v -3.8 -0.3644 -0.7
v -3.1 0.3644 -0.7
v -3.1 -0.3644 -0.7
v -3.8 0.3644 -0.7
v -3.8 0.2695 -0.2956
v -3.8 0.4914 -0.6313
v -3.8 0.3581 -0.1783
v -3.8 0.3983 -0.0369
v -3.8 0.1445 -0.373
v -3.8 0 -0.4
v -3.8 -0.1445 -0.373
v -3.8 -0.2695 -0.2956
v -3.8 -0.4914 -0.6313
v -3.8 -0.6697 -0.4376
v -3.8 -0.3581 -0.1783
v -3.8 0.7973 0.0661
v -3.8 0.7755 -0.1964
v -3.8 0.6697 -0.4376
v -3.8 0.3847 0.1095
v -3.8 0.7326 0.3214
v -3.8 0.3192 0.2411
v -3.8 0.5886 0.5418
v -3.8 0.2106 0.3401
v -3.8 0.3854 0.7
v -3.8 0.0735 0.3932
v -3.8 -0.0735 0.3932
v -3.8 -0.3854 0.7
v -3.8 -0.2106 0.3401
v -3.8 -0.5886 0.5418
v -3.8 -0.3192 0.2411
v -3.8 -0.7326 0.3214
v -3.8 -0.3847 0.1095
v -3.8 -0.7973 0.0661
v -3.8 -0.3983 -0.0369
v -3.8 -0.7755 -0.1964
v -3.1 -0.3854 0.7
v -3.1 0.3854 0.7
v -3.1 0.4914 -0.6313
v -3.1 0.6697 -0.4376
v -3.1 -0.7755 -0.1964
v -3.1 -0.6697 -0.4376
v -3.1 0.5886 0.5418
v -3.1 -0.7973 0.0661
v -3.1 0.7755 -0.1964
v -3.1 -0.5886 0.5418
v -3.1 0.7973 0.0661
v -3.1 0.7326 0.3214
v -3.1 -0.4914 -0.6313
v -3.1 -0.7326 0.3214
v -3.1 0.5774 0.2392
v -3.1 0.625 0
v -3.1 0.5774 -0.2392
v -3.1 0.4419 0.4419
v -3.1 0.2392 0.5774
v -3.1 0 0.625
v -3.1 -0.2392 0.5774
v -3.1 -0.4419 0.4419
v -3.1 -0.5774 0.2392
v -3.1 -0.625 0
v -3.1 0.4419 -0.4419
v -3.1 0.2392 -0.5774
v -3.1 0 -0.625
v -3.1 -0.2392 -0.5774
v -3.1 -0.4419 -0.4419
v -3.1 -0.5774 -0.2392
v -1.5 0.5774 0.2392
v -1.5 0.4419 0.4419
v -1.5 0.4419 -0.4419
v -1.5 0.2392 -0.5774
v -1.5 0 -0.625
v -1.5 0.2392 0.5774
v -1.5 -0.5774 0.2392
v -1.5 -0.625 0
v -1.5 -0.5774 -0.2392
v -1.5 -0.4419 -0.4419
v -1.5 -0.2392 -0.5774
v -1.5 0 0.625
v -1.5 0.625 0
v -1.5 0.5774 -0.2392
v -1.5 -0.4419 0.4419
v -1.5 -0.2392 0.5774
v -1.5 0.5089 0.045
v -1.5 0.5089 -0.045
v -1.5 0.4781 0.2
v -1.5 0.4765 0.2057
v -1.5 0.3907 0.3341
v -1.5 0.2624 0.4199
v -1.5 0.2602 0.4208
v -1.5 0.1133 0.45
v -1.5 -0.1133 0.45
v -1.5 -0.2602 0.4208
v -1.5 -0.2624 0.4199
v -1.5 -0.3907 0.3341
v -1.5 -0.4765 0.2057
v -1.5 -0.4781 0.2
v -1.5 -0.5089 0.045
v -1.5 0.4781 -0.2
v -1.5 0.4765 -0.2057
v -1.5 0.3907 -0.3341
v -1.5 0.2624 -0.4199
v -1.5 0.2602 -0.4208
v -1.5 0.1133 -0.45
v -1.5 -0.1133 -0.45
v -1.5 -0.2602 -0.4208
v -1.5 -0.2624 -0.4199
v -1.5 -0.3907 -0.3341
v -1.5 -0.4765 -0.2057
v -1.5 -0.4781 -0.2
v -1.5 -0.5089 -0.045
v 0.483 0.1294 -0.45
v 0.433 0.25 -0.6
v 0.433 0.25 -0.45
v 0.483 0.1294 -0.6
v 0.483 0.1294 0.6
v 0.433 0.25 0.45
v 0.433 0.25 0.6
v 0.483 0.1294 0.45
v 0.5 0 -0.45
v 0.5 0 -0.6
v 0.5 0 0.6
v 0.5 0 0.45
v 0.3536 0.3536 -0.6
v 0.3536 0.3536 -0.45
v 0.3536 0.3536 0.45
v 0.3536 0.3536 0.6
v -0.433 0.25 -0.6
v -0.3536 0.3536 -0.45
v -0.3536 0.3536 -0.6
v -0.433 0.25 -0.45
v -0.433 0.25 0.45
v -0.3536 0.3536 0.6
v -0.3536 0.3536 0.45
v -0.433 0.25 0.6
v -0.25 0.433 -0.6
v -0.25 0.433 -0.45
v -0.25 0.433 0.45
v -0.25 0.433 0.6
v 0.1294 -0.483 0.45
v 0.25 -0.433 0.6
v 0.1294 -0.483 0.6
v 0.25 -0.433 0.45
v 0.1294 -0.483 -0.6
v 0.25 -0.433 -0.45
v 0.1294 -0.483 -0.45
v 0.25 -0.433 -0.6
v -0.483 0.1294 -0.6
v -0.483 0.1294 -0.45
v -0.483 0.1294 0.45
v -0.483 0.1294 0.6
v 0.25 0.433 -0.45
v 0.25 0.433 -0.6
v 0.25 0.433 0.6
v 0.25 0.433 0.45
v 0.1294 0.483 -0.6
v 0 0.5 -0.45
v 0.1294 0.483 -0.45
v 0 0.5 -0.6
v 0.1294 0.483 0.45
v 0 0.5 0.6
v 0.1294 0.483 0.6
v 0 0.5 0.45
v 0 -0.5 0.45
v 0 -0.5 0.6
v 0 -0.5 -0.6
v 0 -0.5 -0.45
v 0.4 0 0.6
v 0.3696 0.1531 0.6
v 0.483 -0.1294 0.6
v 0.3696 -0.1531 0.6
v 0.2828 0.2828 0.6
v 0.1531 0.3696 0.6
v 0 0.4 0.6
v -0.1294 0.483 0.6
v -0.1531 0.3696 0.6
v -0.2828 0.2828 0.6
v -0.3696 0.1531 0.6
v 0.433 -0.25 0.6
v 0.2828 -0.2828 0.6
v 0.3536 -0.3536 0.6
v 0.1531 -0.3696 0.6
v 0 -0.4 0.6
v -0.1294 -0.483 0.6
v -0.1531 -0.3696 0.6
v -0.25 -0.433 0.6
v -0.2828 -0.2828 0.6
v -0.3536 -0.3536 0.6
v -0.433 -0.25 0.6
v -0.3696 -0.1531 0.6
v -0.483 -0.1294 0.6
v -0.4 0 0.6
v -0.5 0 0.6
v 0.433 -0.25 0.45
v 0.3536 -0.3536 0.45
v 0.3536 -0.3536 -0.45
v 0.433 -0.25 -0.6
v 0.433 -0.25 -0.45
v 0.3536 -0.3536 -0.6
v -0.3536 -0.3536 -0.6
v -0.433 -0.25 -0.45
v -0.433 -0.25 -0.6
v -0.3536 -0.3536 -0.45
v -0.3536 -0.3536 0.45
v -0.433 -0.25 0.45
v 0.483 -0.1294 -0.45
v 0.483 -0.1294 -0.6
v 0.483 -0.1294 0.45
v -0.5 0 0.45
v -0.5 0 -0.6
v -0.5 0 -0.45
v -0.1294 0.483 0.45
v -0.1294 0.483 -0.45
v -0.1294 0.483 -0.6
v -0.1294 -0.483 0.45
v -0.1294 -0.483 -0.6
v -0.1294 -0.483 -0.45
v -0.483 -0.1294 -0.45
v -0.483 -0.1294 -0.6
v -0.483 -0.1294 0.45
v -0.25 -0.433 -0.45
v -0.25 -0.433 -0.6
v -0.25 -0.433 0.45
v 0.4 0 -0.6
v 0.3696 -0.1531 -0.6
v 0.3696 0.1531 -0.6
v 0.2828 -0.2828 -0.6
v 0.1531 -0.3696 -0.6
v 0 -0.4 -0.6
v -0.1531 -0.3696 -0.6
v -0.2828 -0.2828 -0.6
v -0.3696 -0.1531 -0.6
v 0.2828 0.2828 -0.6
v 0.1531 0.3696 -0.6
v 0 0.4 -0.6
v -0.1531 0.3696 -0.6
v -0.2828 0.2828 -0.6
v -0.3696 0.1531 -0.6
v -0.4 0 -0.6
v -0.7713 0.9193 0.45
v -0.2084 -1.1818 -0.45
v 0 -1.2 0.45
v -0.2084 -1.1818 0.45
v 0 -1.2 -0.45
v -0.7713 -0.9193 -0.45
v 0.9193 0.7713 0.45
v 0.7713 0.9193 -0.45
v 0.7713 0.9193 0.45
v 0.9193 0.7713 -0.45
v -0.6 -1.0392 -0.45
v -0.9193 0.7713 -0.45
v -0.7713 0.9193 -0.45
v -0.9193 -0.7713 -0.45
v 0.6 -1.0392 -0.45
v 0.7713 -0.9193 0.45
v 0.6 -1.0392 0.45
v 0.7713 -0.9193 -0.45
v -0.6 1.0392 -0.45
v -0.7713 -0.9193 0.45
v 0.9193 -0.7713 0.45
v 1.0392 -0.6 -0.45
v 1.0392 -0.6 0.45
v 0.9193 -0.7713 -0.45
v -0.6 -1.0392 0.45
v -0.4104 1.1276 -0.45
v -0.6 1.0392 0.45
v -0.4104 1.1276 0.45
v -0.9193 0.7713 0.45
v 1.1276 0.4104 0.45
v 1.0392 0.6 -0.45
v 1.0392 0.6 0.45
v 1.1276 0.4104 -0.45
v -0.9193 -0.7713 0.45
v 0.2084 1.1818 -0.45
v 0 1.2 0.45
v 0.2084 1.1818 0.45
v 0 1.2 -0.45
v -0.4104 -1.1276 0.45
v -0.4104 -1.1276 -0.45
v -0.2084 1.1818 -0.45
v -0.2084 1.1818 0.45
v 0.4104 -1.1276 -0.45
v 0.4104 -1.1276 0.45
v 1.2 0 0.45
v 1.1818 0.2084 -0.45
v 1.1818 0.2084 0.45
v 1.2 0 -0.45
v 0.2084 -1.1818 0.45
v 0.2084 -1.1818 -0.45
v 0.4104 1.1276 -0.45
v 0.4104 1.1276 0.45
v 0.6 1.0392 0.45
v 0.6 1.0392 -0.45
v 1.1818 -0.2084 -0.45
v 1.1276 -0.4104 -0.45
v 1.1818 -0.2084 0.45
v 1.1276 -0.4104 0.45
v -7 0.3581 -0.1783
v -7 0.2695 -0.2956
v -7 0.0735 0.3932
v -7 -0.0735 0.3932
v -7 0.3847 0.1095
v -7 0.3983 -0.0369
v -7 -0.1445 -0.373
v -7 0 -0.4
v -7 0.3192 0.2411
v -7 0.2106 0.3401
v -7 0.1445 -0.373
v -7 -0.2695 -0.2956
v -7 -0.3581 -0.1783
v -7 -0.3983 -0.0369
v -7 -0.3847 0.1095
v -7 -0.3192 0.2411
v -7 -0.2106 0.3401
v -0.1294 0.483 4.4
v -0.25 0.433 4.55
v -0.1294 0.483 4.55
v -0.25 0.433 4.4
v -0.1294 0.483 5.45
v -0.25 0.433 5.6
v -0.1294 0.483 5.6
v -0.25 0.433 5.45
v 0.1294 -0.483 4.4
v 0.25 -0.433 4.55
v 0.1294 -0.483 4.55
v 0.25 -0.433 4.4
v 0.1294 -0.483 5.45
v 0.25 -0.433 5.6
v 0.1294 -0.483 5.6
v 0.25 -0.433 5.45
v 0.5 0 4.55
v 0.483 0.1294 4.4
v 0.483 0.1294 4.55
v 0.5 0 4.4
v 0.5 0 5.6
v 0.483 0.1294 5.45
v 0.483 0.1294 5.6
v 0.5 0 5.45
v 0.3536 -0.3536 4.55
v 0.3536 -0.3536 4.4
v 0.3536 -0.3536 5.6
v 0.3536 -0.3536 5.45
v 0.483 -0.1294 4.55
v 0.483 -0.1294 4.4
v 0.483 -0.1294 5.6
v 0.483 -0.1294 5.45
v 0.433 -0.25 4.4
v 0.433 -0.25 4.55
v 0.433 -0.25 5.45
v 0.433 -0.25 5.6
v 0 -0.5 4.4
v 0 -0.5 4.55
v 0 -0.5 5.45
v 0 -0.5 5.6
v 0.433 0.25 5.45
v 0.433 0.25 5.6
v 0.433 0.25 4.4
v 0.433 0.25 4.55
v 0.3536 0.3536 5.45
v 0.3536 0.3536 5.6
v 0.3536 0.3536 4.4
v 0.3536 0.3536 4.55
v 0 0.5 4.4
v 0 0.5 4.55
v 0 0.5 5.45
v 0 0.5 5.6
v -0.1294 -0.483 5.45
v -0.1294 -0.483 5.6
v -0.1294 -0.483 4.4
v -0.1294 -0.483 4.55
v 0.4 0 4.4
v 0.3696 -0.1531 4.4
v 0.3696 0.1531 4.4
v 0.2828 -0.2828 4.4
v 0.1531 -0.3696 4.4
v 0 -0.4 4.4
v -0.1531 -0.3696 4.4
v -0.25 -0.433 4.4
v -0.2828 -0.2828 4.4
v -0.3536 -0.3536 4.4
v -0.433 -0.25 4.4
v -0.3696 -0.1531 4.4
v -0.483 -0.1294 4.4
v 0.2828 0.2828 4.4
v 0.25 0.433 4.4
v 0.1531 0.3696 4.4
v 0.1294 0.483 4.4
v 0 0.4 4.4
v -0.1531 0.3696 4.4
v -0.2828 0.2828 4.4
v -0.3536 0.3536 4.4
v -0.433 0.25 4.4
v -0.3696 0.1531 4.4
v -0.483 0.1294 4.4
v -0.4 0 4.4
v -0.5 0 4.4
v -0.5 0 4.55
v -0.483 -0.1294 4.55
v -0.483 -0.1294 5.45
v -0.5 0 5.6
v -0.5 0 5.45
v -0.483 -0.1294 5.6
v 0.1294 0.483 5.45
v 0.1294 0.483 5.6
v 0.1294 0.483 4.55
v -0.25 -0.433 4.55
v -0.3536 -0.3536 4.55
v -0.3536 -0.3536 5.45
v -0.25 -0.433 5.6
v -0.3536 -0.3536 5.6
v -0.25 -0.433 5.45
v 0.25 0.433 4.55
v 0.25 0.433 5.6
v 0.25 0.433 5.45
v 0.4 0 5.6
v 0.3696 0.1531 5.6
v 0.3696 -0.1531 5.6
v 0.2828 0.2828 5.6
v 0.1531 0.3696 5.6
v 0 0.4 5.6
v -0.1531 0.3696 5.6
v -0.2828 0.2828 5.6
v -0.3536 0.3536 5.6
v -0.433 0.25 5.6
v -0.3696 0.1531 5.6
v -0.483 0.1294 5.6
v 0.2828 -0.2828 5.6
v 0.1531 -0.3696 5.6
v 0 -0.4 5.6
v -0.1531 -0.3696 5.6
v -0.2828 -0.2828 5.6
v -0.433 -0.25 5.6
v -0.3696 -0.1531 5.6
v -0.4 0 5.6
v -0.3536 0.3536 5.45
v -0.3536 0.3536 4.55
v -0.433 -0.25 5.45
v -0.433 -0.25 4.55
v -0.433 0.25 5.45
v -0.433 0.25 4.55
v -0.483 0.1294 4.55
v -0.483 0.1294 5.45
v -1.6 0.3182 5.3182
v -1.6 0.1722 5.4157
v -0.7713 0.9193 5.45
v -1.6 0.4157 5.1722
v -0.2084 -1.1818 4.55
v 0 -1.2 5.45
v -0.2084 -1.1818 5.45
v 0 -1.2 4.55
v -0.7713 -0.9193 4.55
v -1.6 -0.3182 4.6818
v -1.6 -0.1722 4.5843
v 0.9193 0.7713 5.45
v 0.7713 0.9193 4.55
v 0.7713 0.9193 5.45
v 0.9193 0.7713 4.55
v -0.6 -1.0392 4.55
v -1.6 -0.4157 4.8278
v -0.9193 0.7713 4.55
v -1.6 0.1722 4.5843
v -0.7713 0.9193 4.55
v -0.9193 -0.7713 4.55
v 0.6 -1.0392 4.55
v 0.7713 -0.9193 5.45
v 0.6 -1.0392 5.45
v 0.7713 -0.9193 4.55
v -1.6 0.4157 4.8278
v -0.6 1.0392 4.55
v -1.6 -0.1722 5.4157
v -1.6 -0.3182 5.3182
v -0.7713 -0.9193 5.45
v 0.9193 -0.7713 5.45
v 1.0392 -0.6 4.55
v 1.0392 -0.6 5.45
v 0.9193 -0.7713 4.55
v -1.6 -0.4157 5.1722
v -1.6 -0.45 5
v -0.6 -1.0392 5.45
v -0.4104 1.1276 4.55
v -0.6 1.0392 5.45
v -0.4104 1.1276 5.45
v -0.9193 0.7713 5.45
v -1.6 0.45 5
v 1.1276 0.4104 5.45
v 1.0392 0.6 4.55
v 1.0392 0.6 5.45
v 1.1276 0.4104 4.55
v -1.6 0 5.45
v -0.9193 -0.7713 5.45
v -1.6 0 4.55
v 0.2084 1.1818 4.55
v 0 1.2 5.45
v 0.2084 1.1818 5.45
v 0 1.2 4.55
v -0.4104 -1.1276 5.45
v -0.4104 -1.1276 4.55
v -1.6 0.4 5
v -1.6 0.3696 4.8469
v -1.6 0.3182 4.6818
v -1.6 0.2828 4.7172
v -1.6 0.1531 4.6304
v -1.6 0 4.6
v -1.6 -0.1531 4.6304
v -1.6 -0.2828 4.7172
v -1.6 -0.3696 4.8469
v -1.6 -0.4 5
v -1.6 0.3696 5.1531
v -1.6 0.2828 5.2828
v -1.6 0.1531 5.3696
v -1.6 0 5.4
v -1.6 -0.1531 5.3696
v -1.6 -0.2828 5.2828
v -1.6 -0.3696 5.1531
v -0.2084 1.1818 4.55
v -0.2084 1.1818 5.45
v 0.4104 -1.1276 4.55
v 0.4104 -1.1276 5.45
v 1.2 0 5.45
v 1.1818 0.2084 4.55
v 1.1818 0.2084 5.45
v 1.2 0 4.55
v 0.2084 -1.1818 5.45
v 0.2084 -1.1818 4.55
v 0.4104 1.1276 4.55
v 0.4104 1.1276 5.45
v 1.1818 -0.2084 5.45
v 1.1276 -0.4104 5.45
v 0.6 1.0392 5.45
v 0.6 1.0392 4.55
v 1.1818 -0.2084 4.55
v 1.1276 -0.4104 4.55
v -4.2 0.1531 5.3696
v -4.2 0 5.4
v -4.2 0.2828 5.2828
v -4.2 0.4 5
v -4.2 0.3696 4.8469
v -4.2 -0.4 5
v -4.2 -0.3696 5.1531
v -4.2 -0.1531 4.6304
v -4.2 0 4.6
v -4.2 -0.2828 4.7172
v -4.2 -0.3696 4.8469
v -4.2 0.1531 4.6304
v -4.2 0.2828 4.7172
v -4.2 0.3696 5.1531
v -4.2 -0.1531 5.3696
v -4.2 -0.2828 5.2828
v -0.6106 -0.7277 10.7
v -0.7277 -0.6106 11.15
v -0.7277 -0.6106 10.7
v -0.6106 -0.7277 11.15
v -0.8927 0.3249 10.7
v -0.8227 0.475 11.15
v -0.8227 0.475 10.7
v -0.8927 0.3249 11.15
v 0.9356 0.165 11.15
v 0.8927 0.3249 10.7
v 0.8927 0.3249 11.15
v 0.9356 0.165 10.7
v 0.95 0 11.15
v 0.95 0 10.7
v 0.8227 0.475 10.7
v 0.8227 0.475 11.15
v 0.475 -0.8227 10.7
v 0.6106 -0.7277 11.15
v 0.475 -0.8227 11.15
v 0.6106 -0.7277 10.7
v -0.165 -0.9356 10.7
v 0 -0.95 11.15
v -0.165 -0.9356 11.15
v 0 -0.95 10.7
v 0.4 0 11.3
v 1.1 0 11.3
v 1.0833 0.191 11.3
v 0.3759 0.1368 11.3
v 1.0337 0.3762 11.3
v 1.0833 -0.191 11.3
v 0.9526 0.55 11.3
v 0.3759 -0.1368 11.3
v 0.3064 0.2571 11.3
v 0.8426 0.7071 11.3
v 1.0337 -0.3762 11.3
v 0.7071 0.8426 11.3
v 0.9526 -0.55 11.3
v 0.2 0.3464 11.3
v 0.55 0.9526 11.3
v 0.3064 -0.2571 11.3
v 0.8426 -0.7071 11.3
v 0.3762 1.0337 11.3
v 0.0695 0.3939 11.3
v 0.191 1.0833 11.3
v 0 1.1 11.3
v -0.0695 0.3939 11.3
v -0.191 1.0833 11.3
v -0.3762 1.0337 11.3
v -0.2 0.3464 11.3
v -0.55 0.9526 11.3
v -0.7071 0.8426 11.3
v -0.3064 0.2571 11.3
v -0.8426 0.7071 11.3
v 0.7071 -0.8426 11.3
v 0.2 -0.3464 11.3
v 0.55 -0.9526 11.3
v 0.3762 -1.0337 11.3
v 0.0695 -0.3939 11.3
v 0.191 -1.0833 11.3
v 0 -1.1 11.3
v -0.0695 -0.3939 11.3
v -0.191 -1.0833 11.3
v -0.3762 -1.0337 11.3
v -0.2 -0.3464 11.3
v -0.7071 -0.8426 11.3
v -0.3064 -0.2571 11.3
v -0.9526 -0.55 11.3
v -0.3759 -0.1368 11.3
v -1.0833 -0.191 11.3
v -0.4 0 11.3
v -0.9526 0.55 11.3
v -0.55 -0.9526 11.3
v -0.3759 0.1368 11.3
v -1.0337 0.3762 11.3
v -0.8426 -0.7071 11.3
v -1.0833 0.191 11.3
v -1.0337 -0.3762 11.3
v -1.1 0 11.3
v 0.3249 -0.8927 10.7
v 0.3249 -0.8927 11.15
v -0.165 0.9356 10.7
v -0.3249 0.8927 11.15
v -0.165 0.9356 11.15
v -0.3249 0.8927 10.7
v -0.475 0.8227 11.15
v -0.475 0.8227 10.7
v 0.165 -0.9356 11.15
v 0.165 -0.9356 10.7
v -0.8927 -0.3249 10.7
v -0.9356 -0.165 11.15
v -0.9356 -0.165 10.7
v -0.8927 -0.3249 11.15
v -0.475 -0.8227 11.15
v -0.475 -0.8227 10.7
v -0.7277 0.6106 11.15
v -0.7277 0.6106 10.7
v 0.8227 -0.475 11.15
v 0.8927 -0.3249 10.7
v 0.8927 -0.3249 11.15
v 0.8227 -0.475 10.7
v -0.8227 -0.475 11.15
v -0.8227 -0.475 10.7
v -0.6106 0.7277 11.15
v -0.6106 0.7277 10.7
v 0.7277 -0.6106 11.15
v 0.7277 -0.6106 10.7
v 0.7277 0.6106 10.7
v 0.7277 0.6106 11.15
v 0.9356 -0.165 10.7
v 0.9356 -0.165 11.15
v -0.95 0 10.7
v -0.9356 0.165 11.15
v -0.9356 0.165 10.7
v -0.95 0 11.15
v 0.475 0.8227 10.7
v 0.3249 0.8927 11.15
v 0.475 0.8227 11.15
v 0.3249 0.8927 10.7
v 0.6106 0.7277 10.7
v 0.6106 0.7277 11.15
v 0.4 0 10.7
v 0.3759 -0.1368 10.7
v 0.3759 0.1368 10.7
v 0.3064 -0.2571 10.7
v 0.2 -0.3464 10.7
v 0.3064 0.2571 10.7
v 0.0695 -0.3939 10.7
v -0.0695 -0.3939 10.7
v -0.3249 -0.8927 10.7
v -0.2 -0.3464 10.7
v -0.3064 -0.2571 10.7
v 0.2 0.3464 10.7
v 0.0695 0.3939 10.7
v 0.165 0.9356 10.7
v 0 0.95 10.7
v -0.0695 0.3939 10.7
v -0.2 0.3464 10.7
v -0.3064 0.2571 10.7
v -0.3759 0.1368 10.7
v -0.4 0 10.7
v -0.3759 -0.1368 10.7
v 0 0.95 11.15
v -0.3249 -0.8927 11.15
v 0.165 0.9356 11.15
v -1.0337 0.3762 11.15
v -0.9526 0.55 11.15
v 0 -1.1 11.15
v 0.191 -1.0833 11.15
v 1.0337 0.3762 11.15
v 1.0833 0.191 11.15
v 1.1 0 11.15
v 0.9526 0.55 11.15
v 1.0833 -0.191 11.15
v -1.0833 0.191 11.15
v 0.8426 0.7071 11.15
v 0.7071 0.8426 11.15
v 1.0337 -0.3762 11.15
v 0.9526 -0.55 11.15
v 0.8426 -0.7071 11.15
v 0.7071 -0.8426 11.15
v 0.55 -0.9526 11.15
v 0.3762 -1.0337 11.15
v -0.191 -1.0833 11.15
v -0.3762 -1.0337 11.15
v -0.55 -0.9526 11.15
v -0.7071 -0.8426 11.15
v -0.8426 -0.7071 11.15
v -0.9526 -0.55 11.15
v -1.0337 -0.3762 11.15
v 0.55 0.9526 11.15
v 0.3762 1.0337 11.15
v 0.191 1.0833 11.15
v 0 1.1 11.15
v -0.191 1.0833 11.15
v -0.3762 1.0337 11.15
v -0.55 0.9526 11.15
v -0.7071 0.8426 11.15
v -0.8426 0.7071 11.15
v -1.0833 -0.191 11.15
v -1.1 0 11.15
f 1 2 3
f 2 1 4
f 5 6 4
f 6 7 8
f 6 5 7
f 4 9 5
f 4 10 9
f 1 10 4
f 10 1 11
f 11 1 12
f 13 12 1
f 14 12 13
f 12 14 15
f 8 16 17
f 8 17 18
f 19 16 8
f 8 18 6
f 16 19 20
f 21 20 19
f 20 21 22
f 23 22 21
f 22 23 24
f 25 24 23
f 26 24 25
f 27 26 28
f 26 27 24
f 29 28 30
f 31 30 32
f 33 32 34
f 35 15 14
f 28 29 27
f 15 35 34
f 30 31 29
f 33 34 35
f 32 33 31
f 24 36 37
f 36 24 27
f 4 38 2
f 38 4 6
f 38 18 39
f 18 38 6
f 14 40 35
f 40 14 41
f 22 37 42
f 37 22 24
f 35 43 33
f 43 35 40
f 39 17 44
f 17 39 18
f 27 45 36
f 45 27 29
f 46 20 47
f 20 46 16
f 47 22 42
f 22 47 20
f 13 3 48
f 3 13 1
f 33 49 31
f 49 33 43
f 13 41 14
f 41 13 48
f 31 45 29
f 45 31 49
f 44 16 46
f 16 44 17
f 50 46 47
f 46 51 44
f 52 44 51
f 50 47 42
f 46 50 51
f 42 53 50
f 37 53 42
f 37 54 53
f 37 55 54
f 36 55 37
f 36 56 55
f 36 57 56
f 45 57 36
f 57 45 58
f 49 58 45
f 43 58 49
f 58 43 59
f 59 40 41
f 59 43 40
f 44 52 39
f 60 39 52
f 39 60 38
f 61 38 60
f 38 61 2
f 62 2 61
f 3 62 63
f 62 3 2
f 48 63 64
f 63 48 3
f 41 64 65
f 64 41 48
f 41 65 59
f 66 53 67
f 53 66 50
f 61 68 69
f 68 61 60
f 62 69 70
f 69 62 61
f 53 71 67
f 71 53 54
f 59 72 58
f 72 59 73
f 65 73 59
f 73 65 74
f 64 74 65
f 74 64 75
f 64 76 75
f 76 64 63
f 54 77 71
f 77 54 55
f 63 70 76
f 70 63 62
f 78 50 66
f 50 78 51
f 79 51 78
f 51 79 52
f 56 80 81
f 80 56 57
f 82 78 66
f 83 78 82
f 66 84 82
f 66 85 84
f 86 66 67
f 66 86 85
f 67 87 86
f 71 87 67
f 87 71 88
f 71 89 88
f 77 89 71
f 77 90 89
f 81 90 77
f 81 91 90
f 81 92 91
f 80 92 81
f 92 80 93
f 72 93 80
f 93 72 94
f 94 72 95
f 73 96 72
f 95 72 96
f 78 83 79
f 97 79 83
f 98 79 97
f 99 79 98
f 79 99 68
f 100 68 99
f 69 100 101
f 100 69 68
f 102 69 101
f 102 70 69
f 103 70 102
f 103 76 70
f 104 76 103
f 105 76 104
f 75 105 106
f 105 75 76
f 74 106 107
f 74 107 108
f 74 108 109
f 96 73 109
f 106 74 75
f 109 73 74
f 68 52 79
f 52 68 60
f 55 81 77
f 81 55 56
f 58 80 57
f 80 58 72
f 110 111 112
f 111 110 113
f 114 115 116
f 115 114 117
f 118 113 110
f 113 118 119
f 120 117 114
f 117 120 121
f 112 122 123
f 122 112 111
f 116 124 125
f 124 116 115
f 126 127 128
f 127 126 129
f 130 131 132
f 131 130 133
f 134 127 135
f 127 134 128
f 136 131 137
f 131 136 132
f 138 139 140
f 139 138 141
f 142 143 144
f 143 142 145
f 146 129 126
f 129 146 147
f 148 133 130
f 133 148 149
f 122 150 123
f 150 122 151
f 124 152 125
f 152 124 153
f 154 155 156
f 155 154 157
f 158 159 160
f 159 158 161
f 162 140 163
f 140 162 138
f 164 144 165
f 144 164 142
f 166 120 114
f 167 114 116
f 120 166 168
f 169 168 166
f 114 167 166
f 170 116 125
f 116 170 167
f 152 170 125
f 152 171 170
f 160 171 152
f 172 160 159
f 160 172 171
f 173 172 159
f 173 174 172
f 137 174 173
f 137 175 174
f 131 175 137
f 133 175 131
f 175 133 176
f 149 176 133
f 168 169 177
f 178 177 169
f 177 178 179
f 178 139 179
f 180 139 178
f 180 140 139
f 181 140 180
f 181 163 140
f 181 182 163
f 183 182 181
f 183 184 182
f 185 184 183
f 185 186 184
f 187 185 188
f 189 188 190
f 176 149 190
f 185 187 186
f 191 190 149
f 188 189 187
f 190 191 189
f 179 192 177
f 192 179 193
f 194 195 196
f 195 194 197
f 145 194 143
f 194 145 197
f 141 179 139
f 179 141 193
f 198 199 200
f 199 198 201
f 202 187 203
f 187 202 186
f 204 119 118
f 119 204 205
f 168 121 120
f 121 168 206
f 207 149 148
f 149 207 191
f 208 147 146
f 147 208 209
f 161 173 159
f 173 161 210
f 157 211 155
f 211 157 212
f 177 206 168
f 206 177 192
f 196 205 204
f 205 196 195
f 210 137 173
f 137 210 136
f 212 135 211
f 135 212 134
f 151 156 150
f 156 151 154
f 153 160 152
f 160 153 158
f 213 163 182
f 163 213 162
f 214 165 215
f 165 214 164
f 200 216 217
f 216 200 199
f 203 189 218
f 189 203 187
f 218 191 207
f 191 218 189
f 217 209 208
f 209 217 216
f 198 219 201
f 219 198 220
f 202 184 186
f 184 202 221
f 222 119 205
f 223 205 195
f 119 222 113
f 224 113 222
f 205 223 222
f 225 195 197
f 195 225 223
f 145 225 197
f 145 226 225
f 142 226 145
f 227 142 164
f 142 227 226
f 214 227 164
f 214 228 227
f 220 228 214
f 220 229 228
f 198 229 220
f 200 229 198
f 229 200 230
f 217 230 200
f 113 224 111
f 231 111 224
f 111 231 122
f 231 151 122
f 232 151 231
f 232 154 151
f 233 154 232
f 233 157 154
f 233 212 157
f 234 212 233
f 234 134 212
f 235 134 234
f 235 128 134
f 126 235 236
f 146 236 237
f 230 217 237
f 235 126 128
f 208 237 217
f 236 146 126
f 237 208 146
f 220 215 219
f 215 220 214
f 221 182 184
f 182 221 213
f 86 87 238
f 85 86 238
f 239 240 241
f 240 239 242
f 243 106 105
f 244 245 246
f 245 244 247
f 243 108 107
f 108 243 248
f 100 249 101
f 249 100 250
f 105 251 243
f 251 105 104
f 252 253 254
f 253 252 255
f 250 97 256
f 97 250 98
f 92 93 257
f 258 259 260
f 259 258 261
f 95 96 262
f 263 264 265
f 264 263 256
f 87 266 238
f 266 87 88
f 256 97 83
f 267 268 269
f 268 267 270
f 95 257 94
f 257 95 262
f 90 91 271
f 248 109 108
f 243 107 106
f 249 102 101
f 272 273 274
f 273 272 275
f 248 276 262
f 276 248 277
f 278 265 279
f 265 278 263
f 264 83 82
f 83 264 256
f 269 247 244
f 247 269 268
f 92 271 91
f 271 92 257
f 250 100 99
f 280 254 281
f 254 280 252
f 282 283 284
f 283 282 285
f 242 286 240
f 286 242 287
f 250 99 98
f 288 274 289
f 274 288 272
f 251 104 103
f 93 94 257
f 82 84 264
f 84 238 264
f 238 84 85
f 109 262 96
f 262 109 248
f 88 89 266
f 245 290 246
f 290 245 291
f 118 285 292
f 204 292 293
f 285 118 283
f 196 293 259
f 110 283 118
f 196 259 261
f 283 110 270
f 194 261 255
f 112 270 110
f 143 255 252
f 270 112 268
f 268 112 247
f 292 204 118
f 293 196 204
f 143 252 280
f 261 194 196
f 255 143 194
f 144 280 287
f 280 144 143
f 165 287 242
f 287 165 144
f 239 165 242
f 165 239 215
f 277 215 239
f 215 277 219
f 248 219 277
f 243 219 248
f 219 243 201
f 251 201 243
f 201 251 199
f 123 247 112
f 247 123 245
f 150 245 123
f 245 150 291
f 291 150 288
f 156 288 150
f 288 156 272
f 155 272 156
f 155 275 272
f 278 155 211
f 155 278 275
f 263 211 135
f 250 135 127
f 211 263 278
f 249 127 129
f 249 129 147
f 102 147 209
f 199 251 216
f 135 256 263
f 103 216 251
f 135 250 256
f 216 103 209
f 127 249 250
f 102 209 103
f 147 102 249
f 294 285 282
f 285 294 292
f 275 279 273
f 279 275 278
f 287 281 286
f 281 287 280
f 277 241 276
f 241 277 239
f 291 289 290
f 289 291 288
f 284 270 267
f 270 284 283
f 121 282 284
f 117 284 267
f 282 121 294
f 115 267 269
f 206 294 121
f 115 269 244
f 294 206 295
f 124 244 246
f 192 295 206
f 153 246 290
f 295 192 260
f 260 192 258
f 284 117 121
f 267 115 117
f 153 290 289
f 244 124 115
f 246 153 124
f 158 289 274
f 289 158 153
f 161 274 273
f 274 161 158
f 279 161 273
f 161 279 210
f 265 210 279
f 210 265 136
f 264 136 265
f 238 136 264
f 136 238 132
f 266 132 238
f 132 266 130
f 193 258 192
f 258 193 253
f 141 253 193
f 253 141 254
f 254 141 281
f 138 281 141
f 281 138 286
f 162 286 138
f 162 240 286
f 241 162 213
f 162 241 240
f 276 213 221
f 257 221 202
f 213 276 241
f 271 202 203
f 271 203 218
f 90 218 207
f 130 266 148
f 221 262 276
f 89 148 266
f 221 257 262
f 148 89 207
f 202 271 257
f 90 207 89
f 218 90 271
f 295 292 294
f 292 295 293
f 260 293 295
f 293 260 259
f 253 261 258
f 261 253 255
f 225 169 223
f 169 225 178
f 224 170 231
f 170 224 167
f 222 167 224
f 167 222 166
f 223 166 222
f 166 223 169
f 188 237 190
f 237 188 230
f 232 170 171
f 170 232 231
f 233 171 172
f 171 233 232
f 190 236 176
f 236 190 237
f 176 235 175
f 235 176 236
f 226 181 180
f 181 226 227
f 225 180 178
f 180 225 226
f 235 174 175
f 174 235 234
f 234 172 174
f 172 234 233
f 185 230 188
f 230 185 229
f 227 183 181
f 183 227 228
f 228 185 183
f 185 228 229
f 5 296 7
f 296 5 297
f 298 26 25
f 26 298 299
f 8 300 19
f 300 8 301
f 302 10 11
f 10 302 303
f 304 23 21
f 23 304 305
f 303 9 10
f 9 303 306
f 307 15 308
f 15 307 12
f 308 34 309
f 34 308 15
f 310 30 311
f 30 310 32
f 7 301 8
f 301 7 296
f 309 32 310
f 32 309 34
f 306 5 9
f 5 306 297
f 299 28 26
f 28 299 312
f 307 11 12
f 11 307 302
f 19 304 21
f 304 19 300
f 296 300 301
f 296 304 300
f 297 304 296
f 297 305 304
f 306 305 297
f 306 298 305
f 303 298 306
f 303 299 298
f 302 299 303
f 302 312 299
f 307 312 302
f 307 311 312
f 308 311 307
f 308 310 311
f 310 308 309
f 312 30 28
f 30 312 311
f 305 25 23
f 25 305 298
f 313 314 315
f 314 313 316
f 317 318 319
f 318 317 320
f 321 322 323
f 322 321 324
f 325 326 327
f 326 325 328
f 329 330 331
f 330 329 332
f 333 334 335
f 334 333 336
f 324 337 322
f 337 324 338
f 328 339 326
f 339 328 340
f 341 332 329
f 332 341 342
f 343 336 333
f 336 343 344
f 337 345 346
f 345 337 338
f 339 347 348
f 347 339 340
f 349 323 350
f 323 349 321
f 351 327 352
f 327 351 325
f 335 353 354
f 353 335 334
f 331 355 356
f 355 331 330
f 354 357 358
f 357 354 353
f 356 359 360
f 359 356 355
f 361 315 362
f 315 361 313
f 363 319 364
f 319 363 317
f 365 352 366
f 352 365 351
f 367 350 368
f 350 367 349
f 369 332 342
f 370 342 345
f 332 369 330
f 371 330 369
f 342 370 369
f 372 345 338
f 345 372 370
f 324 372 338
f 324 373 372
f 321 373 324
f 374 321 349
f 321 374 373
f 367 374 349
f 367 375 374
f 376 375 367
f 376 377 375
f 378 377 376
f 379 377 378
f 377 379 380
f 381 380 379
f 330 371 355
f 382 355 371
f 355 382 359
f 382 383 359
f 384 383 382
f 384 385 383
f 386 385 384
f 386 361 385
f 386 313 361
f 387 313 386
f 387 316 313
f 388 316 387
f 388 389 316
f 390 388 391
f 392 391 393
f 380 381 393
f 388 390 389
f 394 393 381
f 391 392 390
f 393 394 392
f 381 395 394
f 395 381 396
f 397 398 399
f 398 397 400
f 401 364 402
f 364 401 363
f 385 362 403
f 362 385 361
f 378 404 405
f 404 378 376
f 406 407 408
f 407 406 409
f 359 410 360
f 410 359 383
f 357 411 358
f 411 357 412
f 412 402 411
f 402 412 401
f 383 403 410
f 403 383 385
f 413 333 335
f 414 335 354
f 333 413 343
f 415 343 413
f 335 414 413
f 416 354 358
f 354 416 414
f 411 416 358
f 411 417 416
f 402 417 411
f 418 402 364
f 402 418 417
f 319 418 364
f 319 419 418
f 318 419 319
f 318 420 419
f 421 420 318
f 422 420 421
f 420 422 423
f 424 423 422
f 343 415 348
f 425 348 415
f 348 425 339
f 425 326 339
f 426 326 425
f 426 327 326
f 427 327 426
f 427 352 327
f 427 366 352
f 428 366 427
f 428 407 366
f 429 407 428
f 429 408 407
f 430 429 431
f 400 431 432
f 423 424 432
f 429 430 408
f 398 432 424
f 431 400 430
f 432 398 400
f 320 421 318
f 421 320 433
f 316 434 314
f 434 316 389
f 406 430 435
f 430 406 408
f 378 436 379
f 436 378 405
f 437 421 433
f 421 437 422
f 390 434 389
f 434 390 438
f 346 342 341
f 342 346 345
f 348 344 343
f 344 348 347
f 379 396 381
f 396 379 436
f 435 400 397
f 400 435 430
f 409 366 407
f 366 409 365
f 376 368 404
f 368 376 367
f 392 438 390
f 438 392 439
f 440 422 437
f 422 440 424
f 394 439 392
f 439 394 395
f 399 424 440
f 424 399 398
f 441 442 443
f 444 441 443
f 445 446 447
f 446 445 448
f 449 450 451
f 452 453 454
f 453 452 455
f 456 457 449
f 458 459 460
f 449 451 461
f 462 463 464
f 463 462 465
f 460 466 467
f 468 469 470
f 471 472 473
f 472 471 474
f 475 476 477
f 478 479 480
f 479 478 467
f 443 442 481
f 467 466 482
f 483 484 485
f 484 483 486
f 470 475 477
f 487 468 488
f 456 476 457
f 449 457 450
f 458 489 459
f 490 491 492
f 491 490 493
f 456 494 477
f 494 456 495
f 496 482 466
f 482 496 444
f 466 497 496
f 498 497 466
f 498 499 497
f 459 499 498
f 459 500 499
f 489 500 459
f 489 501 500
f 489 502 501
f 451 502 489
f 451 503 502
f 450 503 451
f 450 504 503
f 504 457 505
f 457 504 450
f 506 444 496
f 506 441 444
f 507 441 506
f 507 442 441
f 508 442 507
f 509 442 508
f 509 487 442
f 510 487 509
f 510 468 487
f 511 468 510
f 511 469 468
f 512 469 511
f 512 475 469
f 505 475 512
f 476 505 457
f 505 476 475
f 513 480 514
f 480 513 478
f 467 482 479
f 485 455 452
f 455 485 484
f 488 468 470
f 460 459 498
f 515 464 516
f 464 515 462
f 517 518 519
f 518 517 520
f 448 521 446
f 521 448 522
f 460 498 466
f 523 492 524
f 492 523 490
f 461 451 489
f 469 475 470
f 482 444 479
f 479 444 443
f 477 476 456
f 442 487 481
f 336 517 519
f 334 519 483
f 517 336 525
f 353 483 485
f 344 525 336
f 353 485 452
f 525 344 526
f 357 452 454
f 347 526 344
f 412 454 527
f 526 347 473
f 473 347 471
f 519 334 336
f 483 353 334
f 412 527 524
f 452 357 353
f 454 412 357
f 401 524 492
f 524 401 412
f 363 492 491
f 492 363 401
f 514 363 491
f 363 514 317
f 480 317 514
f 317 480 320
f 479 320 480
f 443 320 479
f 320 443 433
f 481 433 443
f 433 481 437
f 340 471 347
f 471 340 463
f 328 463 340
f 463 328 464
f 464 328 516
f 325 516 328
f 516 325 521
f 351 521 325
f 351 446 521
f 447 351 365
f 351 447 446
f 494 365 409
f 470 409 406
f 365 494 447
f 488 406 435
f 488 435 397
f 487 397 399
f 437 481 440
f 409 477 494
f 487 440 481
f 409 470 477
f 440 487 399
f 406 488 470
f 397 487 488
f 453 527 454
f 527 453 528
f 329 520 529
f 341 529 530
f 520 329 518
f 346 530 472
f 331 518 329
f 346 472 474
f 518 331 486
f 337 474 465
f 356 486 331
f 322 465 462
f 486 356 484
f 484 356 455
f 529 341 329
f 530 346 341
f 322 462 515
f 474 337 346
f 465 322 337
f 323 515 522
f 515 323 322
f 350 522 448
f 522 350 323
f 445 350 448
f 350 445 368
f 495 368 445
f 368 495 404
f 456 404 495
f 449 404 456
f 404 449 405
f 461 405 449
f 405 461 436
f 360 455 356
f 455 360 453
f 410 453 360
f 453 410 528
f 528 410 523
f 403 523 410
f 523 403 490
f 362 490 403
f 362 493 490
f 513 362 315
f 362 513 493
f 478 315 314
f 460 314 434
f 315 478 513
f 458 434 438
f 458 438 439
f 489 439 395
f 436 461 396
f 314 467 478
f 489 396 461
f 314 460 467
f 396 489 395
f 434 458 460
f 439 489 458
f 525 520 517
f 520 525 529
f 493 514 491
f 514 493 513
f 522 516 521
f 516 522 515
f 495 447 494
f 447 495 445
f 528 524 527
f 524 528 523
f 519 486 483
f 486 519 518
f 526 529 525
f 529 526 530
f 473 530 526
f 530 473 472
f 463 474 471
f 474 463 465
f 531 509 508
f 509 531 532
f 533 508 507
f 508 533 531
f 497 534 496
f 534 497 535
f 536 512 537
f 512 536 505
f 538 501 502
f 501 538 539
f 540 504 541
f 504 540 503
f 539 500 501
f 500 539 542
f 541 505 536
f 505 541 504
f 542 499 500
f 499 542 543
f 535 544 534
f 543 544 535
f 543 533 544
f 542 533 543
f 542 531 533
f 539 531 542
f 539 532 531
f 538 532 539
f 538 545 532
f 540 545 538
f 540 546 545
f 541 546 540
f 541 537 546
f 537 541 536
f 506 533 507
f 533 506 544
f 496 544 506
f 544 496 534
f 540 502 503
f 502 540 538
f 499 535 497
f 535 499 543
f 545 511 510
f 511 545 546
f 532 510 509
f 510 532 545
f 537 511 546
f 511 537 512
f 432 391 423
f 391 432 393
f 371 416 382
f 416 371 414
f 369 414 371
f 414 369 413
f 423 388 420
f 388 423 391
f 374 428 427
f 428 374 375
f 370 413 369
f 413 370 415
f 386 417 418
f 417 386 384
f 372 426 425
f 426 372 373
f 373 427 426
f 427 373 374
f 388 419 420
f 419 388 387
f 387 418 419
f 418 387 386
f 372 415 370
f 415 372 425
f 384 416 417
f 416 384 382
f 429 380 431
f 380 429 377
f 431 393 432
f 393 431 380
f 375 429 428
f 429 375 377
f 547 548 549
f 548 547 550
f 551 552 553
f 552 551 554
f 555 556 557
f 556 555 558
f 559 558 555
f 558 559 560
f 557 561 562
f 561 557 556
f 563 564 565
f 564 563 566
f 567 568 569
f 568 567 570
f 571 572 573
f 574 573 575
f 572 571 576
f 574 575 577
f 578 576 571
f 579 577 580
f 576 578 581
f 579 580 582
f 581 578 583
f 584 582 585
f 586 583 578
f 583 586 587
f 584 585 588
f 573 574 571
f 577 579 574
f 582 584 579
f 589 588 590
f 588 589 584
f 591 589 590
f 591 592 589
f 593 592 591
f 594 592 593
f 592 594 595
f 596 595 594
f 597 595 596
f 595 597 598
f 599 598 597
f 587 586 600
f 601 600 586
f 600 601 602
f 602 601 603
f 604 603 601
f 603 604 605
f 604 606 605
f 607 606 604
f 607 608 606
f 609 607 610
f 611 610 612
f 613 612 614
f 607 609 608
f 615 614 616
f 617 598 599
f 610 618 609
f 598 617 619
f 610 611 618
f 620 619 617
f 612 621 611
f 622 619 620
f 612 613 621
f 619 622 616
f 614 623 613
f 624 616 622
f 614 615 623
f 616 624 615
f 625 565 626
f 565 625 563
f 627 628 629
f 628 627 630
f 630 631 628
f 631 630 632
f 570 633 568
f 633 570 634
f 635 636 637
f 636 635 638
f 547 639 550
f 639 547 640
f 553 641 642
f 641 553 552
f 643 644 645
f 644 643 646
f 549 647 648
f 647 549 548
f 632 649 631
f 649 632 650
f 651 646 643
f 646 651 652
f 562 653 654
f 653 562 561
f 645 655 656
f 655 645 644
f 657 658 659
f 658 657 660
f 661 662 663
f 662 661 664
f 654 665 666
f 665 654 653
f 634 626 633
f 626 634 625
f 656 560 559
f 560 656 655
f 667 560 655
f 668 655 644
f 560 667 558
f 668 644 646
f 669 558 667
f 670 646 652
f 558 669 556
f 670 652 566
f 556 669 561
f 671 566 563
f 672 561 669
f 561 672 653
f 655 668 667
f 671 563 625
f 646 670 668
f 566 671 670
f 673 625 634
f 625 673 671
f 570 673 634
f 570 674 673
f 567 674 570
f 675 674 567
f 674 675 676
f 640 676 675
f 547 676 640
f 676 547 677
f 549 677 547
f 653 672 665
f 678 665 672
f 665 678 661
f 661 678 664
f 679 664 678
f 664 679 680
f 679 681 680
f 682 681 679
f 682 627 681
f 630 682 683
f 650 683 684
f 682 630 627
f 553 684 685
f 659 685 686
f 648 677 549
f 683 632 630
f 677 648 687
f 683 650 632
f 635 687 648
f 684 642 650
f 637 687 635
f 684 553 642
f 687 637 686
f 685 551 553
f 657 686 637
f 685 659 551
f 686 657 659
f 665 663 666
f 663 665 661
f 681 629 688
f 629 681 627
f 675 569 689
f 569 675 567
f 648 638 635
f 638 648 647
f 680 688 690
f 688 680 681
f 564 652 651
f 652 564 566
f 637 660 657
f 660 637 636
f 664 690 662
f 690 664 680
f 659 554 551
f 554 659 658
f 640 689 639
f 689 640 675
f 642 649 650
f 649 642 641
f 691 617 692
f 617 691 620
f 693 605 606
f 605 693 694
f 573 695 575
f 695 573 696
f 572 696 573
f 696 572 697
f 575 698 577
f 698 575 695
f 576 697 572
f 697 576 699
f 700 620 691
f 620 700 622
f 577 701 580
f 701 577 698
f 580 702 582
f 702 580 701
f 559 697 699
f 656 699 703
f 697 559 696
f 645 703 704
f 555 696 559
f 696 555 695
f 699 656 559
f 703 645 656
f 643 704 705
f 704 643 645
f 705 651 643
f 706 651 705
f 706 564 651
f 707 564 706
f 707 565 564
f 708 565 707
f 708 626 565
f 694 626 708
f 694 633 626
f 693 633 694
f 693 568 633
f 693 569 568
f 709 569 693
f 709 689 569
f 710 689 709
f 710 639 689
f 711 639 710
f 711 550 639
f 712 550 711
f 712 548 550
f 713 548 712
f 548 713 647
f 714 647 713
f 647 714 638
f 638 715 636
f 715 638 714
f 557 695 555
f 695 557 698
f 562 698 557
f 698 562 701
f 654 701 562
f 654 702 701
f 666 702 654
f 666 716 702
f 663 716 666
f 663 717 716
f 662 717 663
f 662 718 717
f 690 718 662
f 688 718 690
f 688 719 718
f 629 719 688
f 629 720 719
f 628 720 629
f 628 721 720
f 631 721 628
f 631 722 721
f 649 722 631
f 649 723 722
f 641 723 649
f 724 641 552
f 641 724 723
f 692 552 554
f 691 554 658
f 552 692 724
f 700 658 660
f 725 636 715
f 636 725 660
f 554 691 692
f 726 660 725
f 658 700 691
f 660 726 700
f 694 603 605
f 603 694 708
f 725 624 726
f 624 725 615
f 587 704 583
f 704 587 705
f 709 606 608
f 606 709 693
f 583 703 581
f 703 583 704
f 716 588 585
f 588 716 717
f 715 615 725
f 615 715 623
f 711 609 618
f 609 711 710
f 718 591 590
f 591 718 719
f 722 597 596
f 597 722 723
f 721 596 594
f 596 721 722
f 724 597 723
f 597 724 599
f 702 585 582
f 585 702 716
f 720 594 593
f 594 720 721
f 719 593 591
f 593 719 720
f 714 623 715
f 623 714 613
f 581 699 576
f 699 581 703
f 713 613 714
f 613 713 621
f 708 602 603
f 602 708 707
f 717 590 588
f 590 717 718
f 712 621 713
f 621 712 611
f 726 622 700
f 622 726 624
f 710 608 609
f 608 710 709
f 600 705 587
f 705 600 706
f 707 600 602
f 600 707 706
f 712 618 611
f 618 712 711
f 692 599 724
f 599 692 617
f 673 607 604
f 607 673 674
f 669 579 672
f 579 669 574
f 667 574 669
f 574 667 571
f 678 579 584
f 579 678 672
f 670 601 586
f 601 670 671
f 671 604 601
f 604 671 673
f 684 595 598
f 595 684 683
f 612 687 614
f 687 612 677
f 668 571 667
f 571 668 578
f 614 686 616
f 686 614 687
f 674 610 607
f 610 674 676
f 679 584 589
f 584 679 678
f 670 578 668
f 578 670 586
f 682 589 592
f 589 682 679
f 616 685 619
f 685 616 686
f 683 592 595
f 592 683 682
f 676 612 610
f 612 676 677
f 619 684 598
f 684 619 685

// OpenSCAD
// Utilities for steel jansen linkage

SI8onBolt();
translate([0,0,5]) SA8();
translate([0,0,11]) F698();

module SI8onBolt() {
  translate([-7,0,0]) rotate([0,90,0])
    cylinder(r=.8/2,h=5,$fn=17);
  SI8();
}

// SI8T/K rod end (female)
module SI8() scale(.1) difference() {
  union() {
    cylinder(r=10/2,h=12,center=true,$fn=24);
    hull() {
      cylinder(r=24/2,h=9,center=true,$fn=36);
      translate([-16,0,0]) rotate([0,90,0]) cylinder(r=4.5,h=1,$fn=16);
    }
    translate([-38,0,0]) rotate([0,90,0]) {
      cylinder(r=12.5/2,h=23,$fn=16);
      intersection() {
        translate([0,0,4]) cube([14,16,8],center=true);
        cylinder(r=16/2,h=7,$fn=19);
      }
    }
  }
  cylinder(r=8/2,h=22,center=true,$fn=16);
}

// SA8T/K rod end
module SA8() scale(.1) difference() {
  union() {
    cylinder(r=10/2,h=12,center=true,$fn=24);
    hull() {
      cylinder(r=24/2,h=9,center=true,$fn=36);
      translate([-16,0,0]) rotate([0,90,0]) cylinder(r=4.5,h=1,$fn=16);
    }
    translate([-42,0,0]) rotate([0,90,0]) cylinder(r=8/2,h=30,$fn=16);
  }
  cylinder(r=8/2,h=22,center=true,$fn=16);
}

// F688 8x16x5 bearing  flange 18x1.1
module F688 () scale(.1) difference() { union() {
  cylinder(r=8,h=5,$fn=36,center=true);
  translate([0,0,2.5-1.1]) cylinder(r=9,h=1.1,$fn=36);
  }
  cylinder(r=4,h=8,$fn=18,center=true);
}

//F698 8x19x6  flange 22x1.5
module F698 () scale(.1) difference() { union() {
  cylinder(r=19/2,h=6,$fn=36,center=true);
  translate([0,0,3-1.5]) cylinder(r=11,h=1.5,$fn=36);
  }
  cylinder(r=4,h=8,$fn=18,center=true);
}

//F608 8x22x7  flange 25x1.5
module F608 () scale(.1) difference() { union() {
  cylinder(r=11,h=7,$fn=36,center=true);
  translate([0,0,3.5-1.5]) cylinder(r=12.5,h=1.5,$fn=36);
  }
  cylinder(r=4,h=8,$fn=18,center=true);
}
